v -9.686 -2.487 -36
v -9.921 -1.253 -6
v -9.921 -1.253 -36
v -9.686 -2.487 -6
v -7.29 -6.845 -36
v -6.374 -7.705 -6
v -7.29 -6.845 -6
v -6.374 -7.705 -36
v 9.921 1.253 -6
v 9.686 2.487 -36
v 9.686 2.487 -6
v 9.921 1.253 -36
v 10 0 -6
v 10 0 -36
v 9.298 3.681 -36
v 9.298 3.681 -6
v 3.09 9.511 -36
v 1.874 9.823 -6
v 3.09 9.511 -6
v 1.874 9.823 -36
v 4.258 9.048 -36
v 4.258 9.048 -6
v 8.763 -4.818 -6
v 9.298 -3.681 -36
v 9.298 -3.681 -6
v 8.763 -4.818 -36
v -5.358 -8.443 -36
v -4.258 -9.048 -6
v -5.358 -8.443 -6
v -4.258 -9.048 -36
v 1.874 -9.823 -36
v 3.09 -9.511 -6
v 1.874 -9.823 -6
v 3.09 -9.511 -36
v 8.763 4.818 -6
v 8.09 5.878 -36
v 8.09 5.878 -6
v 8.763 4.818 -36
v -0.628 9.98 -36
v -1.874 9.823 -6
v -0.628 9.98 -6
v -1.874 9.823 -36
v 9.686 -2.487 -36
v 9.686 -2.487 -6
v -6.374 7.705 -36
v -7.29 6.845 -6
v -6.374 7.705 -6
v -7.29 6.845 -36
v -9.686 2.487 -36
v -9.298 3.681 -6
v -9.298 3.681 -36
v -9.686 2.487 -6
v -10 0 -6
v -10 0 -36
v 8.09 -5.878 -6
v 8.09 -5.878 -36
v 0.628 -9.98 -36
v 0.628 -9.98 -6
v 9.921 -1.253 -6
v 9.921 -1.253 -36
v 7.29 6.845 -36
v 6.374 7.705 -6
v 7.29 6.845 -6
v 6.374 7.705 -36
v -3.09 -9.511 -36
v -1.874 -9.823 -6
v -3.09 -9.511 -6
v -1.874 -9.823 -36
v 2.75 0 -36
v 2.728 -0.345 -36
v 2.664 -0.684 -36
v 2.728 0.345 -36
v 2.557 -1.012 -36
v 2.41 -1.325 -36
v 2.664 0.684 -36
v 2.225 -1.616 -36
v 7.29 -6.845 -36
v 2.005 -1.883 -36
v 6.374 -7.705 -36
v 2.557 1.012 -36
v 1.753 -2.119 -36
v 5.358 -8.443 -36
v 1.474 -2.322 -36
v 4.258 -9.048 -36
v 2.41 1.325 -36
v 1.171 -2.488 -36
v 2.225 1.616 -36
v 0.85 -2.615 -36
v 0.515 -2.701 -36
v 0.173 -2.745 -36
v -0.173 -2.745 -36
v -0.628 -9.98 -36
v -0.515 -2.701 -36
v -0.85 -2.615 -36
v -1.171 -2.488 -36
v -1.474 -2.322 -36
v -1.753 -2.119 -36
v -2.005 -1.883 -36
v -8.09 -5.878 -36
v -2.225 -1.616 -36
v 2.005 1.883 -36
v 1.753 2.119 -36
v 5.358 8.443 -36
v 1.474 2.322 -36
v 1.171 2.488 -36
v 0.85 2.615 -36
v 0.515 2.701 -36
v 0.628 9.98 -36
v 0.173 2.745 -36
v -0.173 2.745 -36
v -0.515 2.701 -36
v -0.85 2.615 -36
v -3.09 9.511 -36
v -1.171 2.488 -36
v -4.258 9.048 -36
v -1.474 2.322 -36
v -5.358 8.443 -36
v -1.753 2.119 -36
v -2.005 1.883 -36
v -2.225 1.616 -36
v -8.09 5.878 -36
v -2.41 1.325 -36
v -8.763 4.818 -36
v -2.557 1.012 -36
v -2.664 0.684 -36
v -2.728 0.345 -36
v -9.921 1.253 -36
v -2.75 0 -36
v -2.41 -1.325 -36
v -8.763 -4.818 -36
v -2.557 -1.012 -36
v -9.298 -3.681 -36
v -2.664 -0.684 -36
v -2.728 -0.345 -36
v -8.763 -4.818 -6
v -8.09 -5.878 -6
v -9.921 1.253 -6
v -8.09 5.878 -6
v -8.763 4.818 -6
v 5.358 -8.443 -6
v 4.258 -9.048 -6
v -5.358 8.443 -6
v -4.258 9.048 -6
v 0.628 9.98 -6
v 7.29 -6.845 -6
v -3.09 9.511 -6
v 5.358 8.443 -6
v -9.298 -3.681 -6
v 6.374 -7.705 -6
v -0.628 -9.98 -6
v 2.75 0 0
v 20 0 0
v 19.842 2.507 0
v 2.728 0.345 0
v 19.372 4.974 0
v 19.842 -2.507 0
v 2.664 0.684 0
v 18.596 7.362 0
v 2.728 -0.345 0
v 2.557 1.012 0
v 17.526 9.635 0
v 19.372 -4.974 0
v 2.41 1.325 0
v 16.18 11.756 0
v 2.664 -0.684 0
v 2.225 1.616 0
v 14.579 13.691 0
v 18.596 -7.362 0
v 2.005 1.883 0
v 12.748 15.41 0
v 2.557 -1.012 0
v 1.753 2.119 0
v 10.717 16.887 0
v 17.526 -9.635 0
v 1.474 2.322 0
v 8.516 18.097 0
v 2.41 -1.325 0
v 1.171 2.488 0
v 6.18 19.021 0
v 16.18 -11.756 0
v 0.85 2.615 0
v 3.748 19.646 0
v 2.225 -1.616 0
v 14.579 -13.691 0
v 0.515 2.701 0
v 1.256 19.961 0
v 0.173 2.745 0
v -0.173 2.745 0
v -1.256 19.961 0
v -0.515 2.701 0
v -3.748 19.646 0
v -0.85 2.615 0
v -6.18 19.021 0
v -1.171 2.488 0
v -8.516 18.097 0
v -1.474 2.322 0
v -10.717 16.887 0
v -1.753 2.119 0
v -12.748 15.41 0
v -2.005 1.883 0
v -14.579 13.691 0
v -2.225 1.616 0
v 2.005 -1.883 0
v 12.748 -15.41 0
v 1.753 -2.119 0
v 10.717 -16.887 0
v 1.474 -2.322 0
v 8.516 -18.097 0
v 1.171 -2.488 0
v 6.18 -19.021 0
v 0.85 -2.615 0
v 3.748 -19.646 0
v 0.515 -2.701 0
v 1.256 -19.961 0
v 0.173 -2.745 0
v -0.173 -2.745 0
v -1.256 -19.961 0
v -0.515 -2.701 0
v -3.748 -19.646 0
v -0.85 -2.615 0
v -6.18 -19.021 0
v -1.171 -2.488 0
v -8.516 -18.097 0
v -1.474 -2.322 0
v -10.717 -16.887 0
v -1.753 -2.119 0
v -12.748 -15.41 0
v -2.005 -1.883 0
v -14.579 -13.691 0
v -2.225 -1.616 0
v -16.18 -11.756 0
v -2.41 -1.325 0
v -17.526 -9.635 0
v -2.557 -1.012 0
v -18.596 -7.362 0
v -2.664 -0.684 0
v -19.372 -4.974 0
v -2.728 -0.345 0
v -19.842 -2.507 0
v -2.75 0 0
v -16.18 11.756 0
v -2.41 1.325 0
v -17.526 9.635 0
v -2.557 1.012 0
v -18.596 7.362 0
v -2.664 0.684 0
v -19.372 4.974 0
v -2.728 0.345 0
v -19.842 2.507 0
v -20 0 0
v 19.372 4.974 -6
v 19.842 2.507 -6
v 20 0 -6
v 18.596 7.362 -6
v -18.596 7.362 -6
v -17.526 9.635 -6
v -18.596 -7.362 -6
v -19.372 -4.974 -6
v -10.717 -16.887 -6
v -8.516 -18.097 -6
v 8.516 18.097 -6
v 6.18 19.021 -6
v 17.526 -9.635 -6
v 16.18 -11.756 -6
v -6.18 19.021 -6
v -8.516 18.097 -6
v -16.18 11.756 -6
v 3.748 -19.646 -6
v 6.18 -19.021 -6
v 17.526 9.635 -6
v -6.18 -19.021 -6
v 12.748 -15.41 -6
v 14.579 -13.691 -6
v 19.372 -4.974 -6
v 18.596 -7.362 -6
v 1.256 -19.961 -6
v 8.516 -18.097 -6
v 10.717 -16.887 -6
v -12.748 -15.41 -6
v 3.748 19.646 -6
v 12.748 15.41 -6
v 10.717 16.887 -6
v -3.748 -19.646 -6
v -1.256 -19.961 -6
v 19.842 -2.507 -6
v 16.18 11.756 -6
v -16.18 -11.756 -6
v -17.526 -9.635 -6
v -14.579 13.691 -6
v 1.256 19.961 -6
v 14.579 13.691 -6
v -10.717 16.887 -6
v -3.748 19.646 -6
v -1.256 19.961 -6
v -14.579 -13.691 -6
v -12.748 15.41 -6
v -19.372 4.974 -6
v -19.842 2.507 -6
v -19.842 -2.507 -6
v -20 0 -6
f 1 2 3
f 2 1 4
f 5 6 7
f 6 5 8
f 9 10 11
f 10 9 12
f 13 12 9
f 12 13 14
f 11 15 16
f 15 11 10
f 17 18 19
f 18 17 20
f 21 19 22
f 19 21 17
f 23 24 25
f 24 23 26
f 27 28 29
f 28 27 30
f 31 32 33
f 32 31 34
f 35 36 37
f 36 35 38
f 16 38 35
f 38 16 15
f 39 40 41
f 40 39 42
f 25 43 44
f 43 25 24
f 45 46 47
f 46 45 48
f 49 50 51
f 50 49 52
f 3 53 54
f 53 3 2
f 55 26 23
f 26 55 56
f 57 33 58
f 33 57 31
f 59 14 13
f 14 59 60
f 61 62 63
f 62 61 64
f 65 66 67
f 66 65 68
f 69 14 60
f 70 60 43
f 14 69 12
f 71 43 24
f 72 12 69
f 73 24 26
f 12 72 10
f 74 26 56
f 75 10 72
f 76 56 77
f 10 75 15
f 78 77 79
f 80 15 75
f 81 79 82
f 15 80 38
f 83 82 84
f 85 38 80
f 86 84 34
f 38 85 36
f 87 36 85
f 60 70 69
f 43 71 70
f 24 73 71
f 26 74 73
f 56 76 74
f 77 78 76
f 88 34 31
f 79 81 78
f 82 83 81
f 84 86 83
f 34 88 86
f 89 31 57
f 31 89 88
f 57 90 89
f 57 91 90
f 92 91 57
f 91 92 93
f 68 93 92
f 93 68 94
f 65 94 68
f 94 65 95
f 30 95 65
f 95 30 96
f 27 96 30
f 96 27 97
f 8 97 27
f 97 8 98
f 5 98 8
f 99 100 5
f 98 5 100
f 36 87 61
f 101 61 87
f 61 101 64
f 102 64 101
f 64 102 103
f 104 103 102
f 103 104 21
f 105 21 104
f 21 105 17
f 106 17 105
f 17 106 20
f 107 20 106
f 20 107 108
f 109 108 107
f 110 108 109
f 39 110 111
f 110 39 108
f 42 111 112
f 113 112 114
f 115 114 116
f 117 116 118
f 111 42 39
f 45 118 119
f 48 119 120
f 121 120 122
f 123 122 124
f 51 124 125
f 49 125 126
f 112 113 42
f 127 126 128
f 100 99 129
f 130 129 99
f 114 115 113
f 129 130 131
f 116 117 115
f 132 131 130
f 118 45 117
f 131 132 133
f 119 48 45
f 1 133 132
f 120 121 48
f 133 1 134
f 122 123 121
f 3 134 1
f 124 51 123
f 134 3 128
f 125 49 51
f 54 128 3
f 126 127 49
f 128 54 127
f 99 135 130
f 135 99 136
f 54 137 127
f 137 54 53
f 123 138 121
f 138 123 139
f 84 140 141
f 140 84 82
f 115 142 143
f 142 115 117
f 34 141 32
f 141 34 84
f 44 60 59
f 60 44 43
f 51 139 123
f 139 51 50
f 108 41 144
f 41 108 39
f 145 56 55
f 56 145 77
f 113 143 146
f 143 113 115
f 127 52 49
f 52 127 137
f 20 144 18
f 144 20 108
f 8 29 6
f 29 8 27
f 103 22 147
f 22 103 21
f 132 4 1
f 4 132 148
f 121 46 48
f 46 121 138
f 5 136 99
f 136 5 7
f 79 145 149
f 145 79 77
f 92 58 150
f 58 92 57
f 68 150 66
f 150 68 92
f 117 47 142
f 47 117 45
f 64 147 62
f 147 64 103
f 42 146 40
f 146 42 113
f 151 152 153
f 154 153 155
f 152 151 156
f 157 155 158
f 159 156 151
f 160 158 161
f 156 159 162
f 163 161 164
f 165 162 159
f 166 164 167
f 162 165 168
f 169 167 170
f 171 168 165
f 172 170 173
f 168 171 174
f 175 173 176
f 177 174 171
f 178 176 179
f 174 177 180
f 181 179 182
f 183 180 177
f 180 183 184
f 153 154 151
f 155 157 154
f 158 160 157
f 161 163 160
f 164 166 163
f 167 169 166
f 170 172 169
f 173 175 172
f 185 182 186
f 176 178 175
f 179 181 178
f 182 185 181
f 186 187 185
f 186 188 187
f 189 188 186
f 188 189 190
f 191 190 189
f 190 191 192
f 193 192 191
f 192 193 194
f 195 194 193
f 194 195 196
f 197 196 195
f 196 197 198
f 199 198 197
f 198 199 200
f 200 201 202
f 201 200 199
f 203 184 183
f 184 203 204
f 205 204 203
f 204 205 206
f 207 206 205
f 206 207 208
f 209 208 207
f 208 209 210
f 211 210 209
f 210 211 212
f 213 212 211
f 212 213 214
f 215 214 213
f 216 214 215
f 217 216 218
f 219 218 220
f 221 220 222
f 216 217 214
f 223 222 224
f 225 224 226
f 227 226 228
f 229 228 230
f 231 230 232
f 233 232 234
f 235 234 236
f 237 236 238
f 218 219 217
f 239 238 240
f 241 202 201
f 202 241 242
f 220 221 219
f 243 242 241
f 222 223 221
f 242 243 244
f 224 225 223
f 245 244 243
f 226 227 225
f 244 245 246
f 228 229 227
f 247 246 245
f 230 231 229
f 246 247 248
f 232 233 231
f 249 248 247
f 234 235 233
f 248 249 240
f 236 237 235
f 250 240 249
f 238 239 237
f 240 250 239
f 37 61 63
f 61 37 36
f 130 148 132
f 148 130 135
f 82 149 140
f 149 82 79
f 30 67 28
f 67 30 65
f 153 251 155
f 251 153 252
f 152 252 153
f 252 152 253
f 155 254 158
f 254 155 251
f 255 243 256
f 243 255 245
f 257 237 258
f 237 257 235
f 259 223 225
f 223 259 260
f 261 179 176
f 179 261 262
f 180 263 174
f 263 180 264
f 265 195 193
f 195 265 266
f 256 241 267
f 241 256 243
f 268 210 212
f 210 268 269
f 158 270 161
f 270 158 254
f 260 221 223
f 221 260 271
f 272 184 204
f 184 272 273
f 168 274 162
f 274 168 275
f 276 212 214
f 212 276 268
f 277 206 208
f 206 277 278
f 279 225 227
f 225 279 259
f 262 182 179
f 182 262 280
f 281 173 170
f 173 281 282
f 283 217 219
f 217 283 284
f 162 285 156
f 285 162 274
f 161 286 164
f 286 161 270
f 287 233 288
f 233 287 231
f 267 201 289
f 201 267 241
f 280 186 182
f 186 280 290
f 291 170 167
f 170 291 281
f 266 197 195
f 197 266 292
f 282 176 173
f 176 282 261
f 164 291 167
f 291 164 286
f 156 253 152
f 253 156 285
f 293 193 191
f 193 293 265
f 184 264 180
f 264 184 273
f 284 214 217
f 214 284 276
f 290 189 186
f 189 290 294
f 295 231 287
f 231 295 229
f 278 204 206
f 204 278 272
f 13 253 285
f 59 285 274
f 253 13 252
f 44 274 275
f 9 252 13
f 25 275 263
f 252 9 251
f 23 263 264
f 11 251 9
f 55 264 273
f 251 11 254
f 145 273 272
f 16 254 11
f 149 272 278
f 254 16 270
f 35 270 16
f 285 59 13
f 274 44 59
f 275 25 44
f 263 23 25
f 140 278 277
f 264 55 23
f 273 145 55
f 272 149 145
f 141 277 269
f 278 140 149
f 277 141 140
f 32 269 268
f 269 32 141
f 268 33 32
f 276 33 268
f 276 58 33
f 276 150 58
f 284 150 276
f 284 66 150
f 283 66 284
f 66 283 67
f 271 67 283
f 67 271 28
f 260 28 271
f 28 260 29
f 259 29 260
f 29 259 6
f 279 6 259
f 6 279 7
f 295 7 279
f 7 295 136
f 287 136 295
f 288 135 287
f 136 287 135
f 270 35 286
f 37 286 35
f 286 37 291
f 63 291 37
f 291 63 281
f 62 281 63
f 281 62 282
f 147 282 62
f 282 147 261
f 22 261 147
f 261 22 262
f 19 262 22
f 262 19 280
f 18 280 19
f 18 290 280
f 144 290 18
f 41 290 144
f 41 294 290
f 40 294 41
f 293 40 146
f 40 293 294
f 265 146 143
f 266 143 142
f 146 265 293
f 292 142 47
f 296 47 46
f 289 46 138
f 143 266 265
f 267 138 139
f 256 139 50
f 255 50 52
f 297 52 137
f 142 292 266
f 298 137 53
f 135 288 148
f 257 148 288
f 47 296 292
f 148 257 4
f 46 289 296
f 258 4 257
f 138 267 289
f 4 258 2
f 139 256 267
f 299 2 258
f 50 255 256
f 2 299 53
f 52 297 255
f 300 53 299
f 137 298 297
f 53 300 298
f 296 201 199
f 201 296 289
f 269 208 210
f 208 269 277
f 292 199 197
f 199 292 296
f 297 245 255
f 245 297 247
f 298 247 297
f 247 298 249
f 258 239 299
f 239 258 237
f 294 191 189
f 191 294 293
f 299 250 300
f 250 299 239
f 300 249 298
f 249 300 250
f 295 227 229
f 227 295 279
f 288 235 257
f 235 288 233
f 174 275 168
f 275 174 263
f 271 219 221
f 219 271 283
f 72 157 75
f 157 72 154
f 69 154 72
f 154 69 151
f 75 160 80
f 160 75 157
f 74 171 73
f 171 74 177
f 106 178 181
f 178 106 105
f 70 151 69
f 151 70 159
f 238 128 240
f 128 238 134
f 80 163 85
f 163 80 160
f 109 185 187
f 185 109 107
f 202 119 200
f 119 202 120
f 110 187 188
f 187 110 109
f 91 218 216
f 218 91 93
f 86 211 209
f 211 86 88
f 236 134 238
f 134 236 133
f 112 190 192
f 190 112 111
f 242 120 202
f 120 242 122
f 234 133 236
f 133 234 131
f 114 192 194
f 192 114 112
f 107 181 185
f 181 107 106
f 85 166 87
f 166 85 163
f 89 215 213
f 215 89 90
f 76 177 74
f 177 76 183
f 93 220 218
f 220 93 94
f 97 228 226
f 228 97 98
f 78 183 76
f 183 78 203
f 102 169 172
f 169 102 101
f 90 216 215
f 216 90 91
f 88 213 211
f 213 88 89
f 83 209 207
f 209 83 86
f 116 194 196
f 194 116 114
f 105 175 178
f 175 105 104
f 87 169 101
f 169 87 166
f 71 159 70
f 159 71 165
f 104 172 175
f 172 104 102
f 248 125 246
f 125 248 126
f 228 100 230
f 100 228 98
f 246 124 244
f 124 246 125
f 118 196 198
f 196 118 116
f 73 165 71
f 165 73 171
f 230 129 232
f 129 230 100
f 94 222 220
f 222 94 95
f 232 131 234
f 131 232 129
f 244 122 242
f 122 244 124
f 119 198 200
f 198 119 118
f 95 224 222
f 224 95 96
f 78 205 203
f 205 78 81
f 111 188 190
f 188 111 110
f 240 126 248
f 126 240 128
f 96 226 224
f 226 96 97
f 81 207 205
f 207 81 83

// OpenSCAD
$fn = 50;


difference() {
	union() {
		translate(v = [0, 0, -36.0000000000]) {
			cylinder(h = 36, r = 10.0000000000);
		}
		translate(v = [0, 0, -6.0000000000]) {
			cylinder(h = 6, r = 20.0000000000);
		}
	}
	union() {
		#translate(v = [0, 0, -36]) {
			cylinder(h = 36, r = 2.7500000000);
		}
	}
}
